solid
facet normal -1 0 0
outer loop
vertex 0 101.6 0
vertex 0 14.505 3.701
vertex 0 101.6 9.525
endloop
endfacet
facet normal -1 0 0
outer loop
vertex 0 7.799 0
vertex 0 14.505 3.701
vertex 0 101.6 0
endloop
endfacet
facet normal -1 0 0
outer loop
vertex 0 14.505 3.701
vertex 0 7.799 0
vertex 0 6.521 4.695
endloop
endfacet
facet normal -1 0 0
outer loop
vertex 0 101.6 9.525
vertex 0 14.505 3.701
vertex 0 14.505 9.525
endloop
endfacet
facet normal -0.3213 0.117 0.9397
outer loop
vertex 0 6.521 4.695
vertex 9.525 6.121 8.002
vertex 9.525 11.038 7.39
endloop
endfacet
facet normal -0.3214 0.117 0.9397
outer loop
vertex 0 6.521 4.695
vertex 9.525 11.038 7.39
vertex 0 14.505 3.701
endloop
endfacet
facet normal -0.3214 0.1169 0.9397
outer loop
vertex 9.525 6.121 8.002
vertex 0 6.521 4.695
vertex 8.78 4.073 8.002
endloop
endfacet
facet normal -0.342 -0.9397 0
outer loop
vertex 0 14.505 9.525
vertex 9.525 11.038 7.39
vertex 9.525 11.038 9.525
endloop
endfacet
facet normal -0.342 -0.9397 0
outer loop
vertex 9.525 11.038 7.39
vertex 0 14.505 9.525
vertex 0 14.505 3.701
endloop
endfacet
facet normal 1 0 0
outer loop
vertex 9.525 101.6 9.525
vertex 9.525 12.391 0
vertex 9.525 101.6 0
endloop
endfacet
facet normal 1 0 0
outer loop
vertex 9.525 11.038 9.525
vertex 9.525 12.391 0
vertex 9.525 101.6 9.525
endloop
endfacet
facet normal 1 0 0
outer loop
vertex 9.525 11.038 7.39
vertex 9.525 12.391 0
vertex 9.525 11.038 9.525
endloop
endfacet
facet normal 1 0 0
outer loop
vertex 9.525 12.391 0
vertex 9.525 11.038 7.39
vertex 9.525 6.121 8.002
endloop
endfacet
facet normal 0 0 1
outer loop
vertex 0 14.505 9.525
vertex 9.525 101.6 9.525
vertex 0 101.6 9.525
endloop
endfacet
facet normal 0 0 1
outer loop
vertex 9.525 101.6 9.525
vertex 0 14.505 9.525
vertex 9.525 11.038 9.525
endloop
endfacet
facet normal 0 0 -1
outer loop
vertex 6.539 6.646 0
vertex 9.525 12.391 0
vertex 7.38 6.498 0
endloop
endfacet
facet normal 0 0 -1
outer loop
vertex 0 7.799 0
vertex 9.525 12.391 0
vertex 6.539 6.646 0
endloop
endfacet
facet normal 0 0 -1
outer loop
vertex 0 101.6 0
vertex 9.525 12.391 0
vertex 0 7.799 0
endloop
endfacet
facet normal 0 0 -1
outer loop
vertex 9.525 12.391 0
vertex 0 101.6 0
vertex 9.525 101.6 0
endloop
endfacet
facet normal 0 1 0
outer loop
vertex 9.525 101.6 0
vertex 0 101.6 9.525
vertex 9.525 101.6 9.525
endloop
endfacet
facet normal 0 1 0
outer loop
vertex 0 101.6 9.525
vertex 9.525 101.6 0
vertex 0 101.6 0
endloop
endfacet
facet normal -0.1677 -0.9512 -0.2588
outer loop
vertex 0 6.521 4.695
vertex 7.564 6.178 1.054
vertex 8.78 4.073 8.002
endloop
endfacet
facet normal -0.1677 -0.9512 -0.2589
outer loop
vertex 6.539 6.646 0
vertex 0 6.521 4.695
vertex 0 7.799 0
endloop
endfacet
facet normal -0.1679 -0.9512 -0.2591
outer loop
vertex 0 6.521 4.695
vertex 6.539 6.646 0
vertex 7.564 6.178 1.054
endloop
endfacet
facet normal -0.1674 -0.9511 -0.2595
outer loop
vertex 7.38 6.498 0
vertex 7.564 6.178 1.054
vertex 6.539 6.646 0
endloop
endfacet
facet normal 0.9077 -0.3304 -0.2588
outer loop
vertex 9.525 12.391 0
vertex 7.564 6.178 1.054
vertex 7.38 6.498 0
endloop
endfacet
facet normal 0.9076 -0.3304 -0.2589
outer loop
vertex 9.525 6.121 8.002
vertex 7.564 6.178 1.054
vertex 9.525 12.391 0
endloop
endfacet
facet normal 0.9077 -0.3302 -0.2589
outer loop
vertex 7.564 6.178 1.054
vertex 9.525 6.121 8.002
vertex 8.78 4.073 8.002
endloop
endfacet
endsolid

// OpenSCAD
// toolbit width in mm (default: 9.5 [3/8"])
$blank_h = 9.525; // [6.35:15.875]
// toolbit height in mm (default: 9.5 [3/8"])
$blank_v = 9.525; // [6.35:15.875]
// toolbit length in mm (default: 100 [4"])
$blank_len = 101.6; // [25:200]

// tool angles - see tool-angle-nomeclature.png


$side_rake = 20; //[0:35]
$side_cutting_edge = 20; // [0:35]
$side_relief = 15; //[0:20]
$end_cutting_edge = 10; //[0:45]
$end_relief = 15;// [0:40]
$back_rake = 5; //5; // [-35:35]
$nose_radius = 0; // [0]

$face_len = $blank_h - ($blank_h / 5); // [0:15.875]

// see calc_face_coords for unrolling
function calc_face_near_y(h, v, clr, rake, face_len) =  (abs(tan(clr)) * (v + (abs(tan(rake)) * (abs(sin(rake)) * face_len)) + (abs(tan(clr)) * (abs(tan(clr)) * v))) - ((abs(tan(clr)) * v) + (abs(sin(rake)) * face_len) - v));
function calc_face_far_y(rake, face_len) =  (abs(tan(rake)) * face_len);

function calc_face_far_x(rake, face_len) = (abs(cos(rake)) * face_len);

module calc_face_coords(h, v, clr, rake, face_len) {
    y_off_clr = abs(tan(clr)) * v;
    z_off_clr = abs(tan(clr)) * y_off_clr;
    y_off_rake = abs(sin(rake)) * face_len;
    z_off_rake = abs(tan(rake)) * y_off_rake;
    new_y = y_off_clr + y_off_rake - v;
    new_z = v + z_off_rake + z_off_clr;
    near_y = (abs(tan(clr)) * new_z) - new_y; 
    far_y = (tan(rake)) * face_len;
    // NOTE: 0.5 is from front_face()   
    rv = [ [-0.5, 
        near_y],
      [-0.5 + (abs(cos(rake)) * face_len), 
       near_y + far_y]
    ];
}

function calc_face_y_offset(h, v, clr, rake) = ((abs(tan(clr)) * v) + (abs(tan(rake)) * h) - v);

function calc_face_z_offset(h, v, clr, rake) = (v + (abs(tan(rake)) * (abs(tan(rake)) * h)) + (abs(tan(clr)) * (abs(tan(clr)) * v)));
    
// Construct a basic rectangular toolbit
module basic_toolbit(h, v, length){
    cube([h, length, v]);
}

// Apply end-relief (front clearance) and
// end-cutting-edge (front rake)
module front_face(h, v, clr, rake) {
    /* DEBUG:
    tan_clr = abs(tan(clr));
    y_off_clr = tan_clr * v;
    z_off_clr = tan_clr * y_off_clr;
    
    tan_rake = abs(tan(rake));
    y_off_rake = tan_rake * h;
    z_off_rake = tan_rake * y_off_rake;
    new_y = -(y_off_clr + y_off_rake - v);
    new_z = v + z_off_rake + z_off_clr;
    */
    
    new_y = -calc_face_y_offset(h, v, clr, rake);
    new_z = calc_face_z_offset(h, v, clr, rake);
    
    translate([-2, new_y, new_z]) {

        rotate([clr, 0, rake]) {
            // padding: to account for rotation
            cube([h * 2, v * 2, v * 2]);
        };
    };
}

module side_cutting_edge_and_relief(near_x, near_y, far_x, far_y, h, v, rake, clr) {
    rake_comp = 360 - rake;
    
    // FIXME: near_x should be 0 not -2
    echo(SIDE_X=(near_x + far_x), SIDE_Y=(near_y + far_y));
    translate([near_x + far_x, min(near_y, far_y), 0]) {
        //side_face(sz_h, sz_v, s_edge_comp, s_clr);
        rotate([0, clr, rake_comp]) {
        // padding: to account for rotation
            cube([h, v * 2, v * 2]);
        };
    };

}

// apply side-cutting-edge and side-relief
module side_face(h, v, rake, clr, f_clr, f_rake, face_len) {
    near_y = calc_face_near_y(h, v, f_clr, f_rake, face_len);
    far_y = calc_face_far_y(f_rake, face_len);
    near_x = -2;
    far_x = calc_face_far_x(f_rake, face_len);
    side_cutting_edge_and_relief(near_x, near_y, far_x, far_y, h, v, rake, clr);
}

// Apply back and side rake. 
// This uses values from calc_face_* .
module back_and_side_rake(near_x, near_y, far_x, far_y, h, v, b_rake, s_rake, s_edge) {
    s_edge_comp = 360 - s_edge;
    
    //adj = h - face_len;
    //opp = tan(s_edge) * adj;
    
    ang = f_rake; // WRONG
    inner_x = ((h - far_x) / abs(tan(ang)));
    //inner_x = far_x; //h; //near_x + h;
    inner_y = min(near_y, far_y) ; //+ (-opp);
    outer_y = max(near_y, far_y) ; 


    // back rake
    translate([0, inner_y, v]) {
        rotate([-b_rake, 0, 0]) cube([h, outer_y, v]);
    }
    
    // side rake
    translate([inner_x, inner_y, v]) {
        rotate([0, s_rake, s_edge_comp]) {
            // X changes with side rake: greater for smaller angle
            translate([-0.25, 0 - 0.25, 0]) {
                cube([v, max(near_y, far_y) + 0.25, h * 2]);
            };
        };
    };
}

// apply back rake and side rake
module top_face(h, v, b_rake, f_clr, f_rake, s_rake, s_edge, face_len) {

    near_y = calc_face_near_y(h, v, f_clr, f_rake, face_len);
    far_y = calc_face_far_y(f_rake, face_len);
    near_x = 0;
    far_x = calc_face_far_x(f_rake, face_len);

    back_and_side_rake(near_x, near_y, far_x, far_y, h, v, b_rake, s_rake, s_edge);
    
    // FIXME: cube to clear top face
}


// Calls the above modules and functions to generate
// a lathe toolbit based on 
module standard_lathe_toolbit() {
    difference(){
        // cross section of toolbit in mm
        sz_h = $blank_h;
        sz_v = $blank_v;
        sz_len = $blank_len;
        f_clr = 180 + $end_relief;
        f_rake = 360 - $end_cutting_edge;
        s_clr = $side_relief;
        s_edge = $side_cutting_edge;
        s_rake = 270 - $side_rake;
        b_rake = $back_rake;
        face_len = min($face_len, sz_h); // sz_h - (sz_h / 5);
        
        basic_toolbit(sz_h, sz_v, sz_len);
    
        near_x = -2.0; // FIXME
        near_y = calc_face_near_y(sz_h, sz_v, f_clr, f_rake, face_len);
        far_y = calc_face_far_y(f_rake, face_len);
        far_x = calc_face_far_x(f_rake, face_len);

        /* // DEBUG
        // near_y = (tan(clr) * new_z) - new_y; 
        echo(Y_CLR_15=(tan(15) * sz_v), Y_RAKE_15=(sin(f_rake) * face_len));
        echo(Y_OFF_15=((tan(15) * sz_v) + (sin(f_rake) * face_len) - sz_v));
        echo(Y_CLR_30=(tan(30) * sz_v), Y_RAKE_30=(sin(f_rake) * face_len));
        echo(Y_OFF_30=((tan(30) * sz_v) + (sin(f_rake) * face_len) - sz_v));
        */
        
        echo(NEAR_Y=near_y, FAR_Y=far_y, FAR_X=far_x);
        // clear the unused front of the toolbit to prevent artifacts
        cube([sz_h, min(near_y, far_y), sz_v]);
        
        front_face(sz_h, sz_v, f_clr, f_rake);
  
        /* equivalent to:
        translate([near_x + far_x, near_y + far_y, 0]) {
              side_face(sz_h, sz_v, s_edge, s_clr, f_clr,   f_rake, face_len);
        }; */
        side_cutting_edge_and_relief(near_x, near_y, far_x, far_y, sz_h, sz_v, s_edge, s_clr);
    
        /* equivalent to:
         top_face(sz_h, sz_v, b_rake, f_clr, f_rake, s_rake, s_edge_comp, face_len); */
        back_and_side_rake(near_x, near_y, far_x, far_y, sz_h, sz_v, b_rake, s_rake, s_edge);
    };
}

// main():
standard_lathe_toolbit();

/* // DEBUG TOP FACE
// TESTBED
//opp = tan($side_cutting_edge) * ($blank_h - $face_len);
inner_x = calc_face_far_x($end_cutting_edge, $face_len); 
// clear front of tool bit
inner_y = calc_face_near_y($blank_h, $blank_v, $end_relief, $end_cutting_edge, $face_len) + calc_face_far_y($end_cutting_edge, $face_len); 

//translate([0, inner, 0]) cube([$blank_h, inner_y, $blank_v]);
//cube([$blank_h, -inner_y, $blank_v]);

translate([inner_x, -inner_y, $blank_v]) {
    rotate([0, $side_rake, $side_cutting_edge]) {
        // padding: to account for rotation
        //cube([$blank_h/2,$blank_v*2, $blank_v]);
    };
};
*/

/*  // DEBUG FRONT FACE
    f_clr = 180 + $end_relief;
    f_rake = 360 - $end_cutting_edge;

    tan_clr = abs(tan(f_clr));
    y_off_clr = tan_clr * $blank_v;
    z_off_clr = tan_clr * y_off_clr;
    echo(Z_OFF_C=z_off_rake, Y_OFF_C=y_off_rake, TAN=tan_rake);
    
    tan_rake = abs(tan(f_rake));
    y_off_rake = tan_rake * $blank_h;
    z_off_rake = tan_rake * y_off_rake;
    echo(Z_OFF_R=z_off_rake, Y_OFF_R=y_off_rake, TAN=tan_rake);

    
    // NEW Z is too low!
    new_y = -(y_off_clr + y_off_rake - $blank_v) ;
    new_z = $blank_v + z_off_rake + z_off_clr ;
    echo(Z=new_z)

    translate([-2, new_y, new_z]) {

        rotate([f_clr, 0, f_rake]) {
            // padding: to account for rotation
            //cube([$blank_h * 2, $blank_v * 2, $blank_v * 2]);
        };
    };
    */

        sz_h = $blank_h;
        sz_v = $blank_v;
        sz_len = $blank_len;
        f_clr = 180 + $end_relief;
        f_rake = 360 - $end_cutting_edge;
        s_clr = $side_relief;
        s_edge = $side_cutting_edge;
        s_rake = 270 - $side_rake;
        b_rake = $back_rake;
        face_len = sz_h - (sz_h / 5);    
    s_edge_comp = 360 - s_edge;
    
    near_y = calc_face_near_y(sz_h, sz_v, f_clr, f_rake, face_len);
    far_y = calc_face_far_y(f_rake, face_len);
    near_x = 0;
    
    far_x = calc_face_far_x(f_rake, face_len);
    echo(FAR_X=far_x, RAKE=f_rake, LEN=face_len);
   
    ang = f_rake; // WRONG
    
    echo(ANG=ang, TAN=abs(tan(ang)), X=(sz_h - far_x));
    inner_x = ((sz_h - far_x) / abs(tan(ang)));
    echo(INNER_X=inner_x, FAR_X=far_x, H=sz_h);
    //inner_x = far_x; //h; //near_x + h;
    inner_y = min(near_y, far_y) ; //+ (-opp);
    outer_y = max(near_y, far_y) ; 
    
    // back rake
    translate([0, inner_y, sz_v]) {
        //rotate([-b_rake, 0, 0]) cube([sz_h, outer_y, sz_v]);
    }
    translate([inner_x, inner_y, sz_v]) {
        rotate([0, s_rake, s_edge_comp]) {
            translate([0, -0.25, 0.50]) {
                //cube([sz_v, max(near_y, far_y)+ 0.25, sz_h * 2]);
            };
        };
    };
    
   

/*
    side cutting edge 
    side relief 15
    end cutting edge 80
    end relief 15
    back rake 15-18
    side rake 20
    face_len ?
    node radius 1/64
*/
